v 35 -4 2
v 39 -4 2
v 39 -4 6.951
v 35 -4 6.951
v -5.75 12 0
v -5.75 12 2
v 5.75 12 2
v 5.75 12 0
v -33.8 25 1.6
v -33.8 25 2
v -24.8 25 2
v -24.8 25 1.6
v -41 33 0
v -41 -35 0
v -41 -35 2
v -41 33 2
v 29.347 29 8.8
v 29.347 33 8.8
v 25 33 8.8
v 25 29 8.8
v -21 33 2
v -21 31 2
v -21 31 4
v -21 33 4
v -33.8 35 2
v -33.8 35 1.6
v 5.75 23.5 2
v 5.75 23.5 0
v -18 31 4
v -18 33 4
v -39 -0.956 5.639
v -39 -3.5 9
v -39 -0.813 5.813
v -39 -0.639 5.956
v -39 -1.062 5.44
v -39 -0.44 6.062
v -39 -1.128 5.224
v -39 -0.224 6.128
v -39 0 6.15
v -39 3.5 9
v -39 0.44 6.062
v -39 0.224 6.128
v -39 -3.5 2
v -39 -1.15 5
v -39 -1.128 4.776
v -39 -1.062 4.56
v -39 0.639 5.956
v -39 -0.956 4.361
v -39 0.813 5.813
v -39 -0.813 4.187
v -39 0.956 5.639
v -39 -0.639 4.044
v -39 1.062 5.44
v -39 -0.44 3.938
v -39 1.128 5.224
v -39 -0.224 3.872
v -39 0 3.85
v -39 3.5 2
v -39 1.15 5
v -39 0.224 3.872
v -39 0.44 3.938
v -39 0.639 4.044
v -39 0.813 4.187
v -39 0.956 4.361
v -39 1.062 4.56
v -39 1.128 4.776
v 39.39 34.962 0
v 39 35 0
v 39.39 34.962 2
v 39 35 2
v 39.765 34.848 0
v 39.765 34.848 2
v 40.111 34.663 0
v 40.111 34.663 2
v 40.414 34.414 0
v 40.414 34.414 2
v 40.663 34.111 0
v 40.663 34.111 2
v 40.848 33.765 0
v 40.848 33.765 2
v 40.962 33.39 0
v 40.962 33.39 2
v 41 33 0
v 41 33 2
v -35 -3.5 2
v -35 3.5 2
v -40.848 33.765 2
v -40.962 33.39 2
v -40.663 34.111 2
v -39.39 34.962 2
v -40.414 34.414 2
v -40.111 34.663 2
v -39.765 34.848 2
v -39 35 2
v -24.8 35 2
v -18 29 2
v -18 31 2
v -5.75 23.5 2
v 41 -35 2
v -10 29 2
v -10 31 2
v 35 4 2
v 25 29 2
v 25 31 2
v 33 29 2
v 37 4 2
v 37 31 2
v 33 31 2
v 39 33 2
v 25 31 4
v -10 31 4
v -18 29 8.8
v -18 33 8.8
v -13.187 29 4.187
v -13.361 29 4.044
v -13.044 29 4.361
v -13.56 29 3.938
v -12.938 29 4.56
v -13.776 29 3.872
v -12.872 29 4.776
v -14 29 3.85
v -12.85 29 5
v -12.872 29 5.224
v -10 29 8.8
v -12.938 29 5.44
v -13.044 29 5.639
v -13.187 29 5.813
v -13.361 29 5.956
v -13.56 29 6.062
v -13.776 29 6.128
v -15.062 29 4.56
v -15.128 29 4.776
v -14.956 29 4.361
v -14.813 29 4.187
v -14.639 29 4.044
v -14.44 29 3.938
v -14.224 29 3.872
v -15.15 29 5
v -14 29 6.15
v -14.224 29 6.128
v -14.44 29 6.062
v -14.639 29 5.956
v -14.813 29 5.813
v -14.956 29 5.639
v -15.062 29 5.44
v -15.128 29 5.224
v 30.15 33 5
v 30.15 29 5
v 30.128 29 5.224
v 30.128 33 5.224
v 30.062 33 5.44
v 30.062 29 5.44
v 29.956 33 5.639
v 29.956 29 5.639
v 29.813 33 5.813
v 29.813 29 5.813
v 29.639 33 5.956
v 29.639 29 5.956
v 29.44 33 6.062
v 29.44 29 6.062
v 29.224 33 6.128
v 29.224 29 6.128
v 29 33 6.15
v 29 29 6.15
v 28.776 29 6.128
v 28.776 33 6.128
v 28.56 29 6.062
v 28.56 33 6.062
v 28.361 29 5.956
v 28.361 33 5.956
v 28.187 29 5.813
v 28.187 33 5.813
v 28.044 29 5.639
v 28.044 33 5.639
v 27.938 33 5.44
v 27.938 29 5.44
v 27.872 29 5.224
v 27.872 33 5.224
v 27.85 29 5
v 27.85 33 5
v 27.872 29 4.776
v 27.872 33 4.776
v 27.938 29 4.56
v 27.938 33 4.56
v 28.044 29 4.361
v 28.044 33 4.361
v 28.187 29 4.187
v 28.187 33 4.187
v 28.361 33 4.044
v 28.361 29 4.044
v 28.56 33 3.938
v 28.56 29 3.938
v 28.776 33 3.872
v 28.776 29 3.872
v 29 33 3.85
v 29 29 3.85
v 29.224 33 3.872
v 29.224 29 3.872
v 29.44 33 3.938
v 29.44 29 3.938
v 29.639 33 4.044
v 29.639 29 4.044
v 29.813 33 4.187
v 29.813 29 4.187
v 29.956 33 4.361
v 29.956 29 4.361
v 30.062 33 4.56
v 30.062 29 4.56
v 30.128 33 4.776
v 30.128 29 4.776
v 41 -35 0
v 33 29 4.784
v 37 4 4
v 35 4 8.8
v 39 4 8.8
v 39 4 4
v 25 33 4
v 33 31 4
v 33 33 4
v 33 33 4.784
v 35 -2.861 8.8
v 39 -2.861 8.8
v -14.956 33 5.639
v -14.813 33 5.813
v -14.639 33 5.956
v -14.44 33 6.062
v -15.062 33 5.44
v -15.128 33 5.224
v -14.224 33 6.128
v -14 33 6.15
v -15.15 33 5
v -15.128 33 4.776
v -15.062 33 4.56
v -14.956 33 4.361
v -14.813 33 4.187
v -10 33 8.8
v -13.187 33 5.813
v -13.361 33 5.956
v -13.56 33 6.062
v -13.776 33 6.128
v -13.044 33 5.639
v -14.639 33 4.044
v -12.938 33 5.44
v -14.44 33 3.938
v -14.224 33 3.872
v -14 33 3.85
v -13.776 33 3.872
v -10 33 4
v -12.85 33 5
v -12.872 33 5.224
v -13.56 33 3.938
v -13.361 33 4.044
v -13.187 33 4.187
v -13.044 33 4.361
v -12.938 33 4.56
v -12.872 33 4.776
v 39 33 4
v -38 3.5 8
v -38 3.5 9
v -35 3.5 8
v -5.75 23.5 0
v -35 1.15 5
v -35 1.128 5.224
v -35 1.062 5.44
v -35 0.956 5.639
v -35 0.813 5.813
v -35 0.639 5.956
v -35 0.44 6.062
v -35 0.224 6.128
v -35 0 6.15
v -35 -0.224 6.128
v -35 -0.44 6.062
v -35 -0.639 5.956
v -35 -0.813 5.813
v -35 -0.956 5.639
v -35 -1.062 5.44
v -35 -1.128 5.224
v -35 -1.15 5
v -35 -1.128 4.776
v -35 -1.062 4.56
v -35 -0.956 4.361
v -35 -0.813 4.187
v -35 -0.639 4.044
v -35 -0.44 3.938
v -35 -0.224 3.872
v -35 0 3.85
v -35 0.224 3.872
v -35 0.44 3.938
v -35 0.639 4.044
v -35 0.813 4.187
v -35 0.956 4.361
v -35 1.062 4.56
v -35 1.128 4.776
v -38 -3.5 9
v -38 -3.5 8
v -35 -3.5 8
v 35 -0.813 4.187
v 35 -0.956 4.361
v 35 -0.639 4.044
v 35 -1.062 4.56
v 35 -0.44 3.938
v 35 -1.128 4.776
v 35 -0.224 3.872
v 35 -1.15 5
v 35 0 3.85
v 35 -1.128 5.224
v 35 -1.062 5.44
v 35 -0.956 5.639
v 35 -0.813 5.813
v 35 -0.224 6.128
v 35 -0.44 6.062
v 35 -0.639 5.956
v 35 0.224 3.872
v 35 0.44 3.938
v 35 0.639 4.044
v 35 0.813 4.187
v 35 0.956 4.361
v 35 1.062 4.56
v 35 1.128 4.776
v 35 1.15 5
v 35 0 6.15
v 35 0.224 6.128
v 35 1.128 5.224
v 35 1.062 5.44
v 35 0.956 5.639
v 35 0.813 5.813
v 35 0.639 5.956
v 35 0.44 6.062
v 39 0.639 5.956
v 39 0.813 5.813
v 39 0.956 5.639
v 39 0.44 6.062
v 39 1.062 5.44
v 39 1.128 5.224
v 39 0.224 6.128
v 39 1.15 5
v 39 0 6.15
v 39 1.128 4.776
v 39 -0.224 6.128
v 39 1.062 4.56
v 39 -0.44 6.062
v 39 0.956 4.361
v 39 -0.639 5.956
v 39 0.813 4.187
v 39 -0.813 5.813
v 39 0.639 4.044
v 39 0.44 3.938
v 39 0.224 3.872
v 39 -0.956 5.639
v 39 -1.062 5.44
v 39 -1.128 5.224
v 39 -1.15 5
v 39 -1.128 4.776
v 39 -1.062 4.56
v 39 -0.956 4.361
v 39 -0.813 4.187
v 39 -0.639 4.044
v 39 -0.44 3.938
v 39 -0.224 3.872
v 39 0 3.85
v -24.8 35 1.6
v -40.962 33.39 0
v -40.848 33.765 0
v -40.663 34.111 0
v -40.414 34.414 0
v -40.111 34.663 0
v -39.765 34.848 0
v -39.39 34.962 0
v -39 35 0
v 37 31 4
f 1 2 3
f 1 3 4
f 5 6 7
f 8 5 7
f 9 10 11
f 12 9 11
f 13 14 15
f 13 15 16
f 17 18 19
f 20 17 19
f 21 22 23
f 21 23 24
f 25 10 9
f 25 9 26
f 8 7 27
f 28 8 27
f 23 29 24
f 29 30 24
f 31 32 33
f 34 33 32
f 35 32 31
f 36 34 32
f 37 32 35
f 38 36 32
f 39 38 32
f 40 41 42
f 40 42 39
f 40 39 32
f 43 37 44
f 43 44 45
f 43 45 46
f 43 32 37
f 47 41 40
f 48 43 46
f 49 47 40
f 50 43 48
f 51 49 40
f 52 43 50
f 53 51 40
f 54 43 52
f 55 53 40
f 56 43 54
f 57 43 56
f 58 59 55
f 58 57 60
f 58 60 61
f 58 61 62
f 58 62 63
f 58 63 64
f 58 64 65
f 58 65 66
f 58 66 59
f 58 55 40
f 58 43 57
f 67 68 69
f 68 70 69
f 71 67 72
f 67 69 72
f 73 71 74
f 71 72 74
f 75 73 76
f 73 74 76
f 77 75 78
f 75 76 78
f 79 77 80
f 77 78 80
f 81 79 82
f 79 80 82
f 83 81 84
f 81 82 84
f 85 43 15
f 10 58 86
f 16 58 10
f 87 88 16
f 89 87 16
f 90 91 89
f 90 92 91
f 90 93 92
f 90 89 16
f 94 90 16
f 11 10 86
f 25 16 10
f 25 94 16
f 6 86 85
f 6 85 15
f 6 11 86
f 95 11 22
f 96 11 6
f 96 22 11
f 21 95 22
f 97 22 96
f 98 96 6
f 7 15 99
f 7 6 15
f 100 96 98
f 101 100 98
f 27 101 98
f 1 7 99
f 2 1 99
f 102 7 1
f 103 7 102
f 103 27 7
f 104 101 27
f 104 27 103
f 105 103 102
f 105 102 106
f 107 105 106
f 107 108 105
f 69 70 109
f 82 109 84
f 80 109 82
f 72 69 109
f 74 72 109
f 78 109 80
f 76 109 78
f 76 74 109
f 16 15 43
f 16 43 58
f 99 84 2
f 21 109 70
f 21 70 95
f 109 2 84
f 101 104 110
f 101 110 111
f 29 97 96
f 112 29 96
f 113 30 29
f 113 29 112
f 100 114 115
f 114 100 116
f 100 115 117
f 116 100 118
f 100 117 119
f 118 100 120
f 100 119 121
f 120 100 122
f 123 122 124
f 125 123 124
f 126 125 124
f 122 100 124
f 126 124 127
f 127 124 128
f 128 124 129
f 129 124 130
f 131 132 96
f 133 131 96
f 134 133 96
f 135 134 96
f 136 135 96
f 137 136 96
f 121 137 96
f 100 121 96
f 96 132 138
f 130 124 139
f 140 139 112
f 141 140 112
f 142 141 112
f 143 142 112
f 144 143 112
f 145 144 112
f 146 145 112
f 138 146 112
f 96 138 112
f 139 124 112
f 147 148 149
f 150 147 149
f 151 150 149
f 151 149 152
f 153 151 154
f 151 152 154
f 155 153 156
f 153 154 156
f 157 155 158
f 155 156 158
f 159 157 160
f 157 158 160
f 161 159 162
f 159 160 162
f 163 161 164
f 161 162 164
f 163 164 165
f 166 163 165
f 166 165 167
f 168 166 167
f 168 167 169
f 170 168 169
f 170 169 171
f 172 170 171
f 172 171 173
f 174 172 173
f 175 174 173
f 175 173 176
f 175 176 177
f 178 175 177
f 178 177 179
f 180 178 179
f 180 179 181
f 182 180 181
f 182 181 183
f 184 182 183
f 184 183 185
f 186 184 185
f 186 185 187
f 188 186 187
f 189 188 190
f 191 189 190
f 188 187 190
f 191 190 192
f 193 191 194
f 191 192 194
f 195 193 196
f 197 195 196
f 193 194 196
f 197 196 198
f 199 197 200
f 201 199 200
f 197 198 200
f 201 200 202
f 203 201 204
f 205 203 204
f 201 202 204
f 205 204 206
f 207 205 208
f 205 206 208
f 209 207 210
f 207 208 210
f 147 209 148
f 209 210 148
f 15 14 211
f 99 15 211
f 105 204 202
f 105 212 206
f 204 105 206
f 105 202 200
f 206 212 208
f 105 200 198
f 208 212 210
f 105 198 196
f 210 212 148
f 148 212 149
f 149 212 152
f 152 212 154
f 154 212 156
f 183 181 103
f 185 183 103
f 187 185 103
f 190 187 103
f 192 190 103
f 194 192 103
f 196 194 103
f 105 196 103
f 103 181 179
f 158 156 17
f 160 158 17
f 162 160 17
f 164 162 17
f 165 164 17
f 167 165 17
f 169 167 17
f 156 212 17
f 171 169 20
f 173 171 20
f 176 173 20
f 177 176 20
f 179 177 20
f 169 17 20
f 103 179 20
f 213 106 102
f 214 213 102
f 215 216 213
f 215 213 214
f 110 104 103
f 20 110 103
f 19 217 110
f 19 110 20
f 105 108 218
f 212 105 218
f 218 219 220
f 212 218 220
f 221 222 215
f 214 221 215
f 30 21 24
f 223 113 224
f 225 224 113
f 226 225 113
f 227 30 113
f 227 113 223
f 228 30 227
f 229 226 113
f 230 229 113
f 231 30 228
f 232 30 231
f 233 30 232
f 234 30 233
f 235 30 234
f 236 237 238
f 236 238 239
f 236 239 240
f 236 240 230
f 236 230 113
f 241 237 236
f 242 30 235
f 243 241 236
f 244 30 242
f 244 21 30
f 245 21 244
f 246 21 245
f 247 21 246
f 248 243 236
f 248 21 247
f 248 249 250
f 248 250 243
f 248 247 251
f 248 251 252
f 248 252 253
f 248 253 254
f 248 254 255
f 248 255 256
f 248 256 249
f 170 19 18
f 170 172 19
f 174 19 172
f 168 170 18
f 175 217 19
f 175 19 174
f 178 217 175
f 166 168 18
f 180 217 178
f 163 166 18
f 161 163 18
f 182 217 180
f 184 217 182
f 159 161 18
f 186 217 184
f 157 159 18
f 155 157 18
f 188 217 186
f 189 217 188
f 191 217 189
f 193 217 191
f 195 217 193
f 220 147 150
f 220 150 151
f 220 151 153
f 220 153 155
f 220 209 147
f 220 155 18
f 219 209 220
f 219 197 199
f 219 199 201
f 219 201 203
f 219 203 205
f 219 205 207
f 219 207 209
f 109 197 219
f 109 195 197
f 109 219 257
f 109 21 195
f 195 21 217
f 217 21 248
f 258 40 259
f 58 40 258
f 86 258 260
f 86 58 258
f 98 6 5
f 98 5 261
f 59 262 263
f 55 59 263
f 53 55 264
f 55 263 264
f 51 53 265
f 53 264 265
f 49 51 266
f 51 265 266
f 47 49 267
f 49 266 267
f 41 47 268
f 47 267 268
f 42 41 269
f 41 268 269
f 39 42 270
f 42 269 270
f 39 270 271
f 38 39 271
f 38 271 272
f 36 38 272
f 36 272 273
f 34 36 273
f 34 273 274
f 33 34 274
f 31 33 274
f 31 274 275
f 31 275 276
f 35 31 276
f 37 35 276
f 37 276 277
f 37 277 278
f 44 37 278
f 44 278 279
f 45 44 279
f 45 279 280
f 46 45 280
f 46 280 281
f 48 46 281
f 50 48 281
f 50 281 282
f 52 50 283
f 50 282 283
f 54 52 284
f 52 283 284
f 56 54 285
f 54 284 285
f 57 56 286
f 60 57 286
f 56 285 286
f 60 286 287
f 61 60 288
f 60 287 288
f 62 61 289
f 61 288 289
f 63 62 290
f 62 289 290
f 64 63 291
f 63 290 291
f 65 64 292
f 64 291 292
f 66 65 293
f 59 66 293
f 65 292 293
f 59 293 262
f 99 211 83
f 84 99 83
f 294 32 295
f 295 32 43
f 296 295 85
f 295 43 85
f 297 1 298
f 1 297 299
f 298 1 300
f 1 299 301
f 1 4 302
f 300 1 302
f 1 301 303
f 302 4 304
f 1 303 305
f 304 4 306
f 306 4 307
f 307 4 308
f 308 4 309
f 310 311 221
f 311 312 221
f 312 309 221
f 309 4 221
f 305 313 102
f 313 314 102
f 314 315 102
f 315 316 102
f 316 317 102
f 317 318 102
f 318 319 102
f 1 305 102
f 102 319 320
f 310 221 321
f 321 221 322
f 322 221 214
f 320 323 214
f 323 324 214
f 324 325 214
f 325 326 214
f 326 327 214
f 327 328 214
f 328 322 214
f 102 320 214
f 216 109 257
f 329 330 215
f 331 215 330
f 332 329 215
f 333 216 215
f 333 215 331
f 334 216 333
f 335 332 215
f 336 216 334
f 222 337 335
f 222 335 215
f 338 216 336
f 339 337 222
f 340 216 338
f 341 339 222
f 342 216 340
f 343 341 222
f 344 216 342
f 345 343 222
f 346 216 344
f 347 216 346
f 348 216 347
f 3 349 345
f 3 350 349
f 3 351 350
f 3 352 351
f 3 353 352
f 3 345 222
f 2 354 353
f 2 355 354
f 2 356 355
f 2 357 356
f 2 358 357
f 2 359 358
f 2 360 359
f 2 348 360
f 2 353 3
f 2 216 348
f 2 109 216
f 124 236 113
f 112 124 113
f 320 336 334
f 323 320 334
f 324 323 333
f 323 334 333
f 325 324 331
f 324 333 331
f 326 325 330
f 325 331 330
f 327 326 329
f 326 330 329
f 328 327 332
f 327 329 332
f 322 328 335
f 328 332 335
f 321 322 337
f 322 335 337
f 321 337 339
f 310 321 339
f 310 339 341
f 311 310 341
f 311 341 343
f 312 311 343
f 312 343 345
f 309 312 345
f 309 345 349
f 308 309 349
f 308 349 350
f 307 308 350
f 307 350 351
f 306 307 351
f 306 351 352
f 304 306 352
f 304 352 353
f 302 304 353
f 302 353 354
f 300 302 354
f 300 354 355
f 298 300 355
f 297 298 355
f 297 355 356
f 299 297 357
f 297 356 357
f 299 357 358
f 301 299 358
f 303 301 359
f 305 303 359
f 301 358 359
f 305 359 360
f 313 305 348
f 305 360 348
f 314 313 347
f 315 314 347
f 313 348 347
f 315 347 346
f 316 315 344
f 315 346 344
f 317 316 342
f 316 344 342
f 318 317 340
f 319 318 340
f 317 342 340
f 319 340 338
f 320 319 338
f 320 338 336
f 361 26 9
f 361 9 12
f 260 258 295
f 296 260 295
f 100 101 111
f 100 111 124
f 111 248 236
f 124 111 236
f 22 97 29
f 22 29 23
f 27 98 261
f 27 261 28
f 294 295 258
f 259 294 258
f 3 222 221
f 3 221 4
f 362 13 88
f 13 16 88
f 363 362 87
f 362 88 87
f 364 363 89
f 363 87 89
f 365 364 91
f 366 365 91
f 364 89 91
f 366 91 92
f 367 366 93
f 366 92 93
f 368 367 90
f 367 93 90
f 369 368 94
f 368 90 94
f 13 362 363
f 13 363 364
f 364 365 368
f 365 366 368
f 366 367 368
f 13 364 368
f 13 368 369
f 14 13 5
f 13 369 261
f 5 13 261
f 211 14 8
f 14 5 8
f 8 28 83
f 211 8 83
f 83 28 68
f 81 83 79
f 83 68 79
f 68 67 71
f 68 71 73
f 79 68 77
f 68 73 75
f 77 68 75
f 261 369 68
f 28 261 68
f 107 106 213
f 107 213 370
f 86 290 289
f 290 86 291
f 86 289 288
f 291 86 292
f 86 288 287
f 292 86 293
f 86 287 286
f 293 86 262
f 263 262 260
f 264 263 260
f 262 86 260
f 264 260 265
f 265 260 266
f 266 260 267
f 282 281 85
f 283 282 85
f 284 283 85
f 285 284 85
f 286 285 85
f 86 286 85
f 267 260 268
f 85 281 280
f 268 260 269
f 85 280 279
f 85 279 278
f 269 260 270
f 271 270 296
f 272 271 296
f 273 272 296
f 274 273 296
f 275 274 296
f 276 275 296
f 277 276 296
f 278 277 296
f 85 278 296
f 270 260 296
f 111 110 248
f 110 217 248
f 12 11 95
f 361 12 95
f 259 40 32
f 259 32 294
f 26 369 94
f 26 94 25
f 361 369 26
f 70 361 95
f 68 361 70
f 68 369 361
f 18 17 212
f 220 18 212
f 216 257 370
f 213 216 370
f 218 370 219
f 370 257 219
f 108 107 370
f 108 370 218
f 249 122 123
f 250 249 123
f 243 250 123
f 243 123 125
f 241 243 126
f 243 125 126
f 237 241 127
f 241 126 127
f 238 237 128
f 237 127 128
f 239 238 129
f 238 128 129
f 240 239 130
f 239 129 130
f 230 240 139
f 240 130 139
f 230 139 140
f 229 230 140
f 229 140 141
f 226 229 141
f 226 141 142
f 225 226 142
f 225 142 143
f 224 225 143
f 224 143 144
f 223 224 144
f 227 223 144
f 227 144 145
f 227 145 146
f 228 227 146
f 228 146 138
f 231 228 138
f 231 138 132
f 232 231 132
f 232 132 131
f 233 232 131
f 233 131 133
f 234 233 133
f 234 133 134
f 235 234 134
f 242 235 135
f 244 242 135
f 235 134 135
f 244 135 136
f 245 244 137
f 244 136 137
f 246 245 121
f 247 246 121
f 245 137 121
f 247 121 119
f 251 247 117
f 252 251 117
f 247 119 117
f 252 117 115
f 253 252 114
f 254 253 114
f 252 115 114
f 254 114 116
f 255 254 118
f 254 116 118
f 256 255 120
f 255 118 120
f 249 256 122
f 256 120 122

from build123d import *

# Parameters (mm, degrees)
SKETCH_W        = 82
SKETCH_H        = 70
PAD_DEPTH       = 2
SKETCH001_W     = 2
SKETCH001_H     = 7
PAD001_DEPTH    = 2
SKETCH011_W     = 8
SKETCH011_H     = 6.8
PAD002_DEPTH    = 4
SKETCH012_W     = 7
SKETCH012_H     = 6
PAD003_DEPTH    = 4
SKETCH010_W     = 8
SKETCH010_H     = 6.8
PAD004_DEPTH    = 4
SKETCH013_R     = 1.15
POCKET_DEPTH    = 80.001
SKETCH016_R     = 1.15
POCKET001_DEPTH = 8.501
SKETCH018_W     = 11.5
SKETCH018_H     = 11.5
POCKET002_DEPTH = 5
POCKET003_DEPTH = 5
POCKET004_DEPTH = 5
SKETCH021_W     = 1
SKETCH021_H     = 7
PAD005_DEPTH    = 1
SKETCH022_W     = 9
SKETCH022_H     = 10
POCKET005_DEPTH = 0.4
FILLET_R        = 2


with BuildPart() as part:
    # Sketch → Pad (new body)
    with BuildSketch(Plane.XY):
        Rectangle(SKETCH_W, SKETCH_H)
    extrude(amount=PAD_DEPTH)

    # Sketch001 (on Face6 of Pad) → Pad001 (join)
    with BuildSketch(Plane.XY.offset(2)):
        with Locations((-38, 0)):
            Rectangle(SKETCH001_W, SKETCH001_H)
        Polygon((-21, 33), (39, 33), (39, -4), (37, -4), (37, 31), (-21, 31), align=None)
    extrude(amount=PAD001_DEPTH)

    # Sketch011 (on Face15 of Pad001) → Pad002 (join)
    with BuildSketch(Plane.YZ.offset(39)):
        with Locations((0, 5.4)):
            Rectangle(SKETCH011_W, SKETCH011_H)
    extrude(amount=-PAD002_DEPTH)

    # Sketch012 (on Face9 of Pad002) → Pad003 (join)
    with BuildSketch(Plane(origin=(-39, 0, 0), x_dir=(0, -1, 0), z_dir=(-1, 0, 0))):
        with Locations((0, 5)):
            Rectangle(SKETCH012_W, SKETCH012_H)
    extrude(amount=-PAD003_DEPTH)

    # Sketch010 (on Face16 of Pad001) → Pad004 (join)
    with BuildSketch(Plane(origin=(0, 33, 0), x_dir=(-1, 0, 0), z_dir=(0, 1, 0))):
        with Locations((-29, 5.4)):
            Rectangle(SKETCH010_W, SKETCH010_H)
        with Locations((14, 5.4)):
            Rectangle(SKETCH010_W, SKETCH010_H)
    extrude(amount=-PAD004_DEPTH)

    # Sketch013 (on Face44 of Pad004) → Pocket (cut, through all)
    with BuildSketch(Plane.YZ.offset(39)):
        with Locations((0, 5)):
            Circle(SKETCH013_R)
    extrude(amount=-POCKET_DEPTH, mode=Mode.SUBTRACT)

    # Sketch016 → Pocket001 (cut, through all)
    with BuildSketch(Plane.XZ.offset(-26.5)):
        with Locations((-14, 5)):
            Circle(SKETCH016_R)
        with Locations((29, 5)):
            Circle(SKETCH016_R)
    extrude(amount=-POCKET001_DEPTH, mode=Mode.SUBTRACT)

    # Sketch018 (on Face5 of Pocket001) → Pocket002 (cut)
    with BuildSketch(Plane.XY.offset(2)):
        with Locations((0, 17.75)):
            Rectangle(SKETCH018_W, SKETCH018_H)
    extrude(amount=-POCKET002_DEPTH, mode=Mode.SUBTRACT)

    # Sketch019 (on Face31 of Pocket002) → Pocket003 (cut)
    with BuildSketch(Plane.XZ.offset(-29)):
        Polygon((29.125944, 9.042901), (33.258869, 4.499726), (33.258869, 9.042901), align=None)
    extrude(amount=-POCKET003_DEPTH, mode=Mode.SUBTRACT)

    # Sketch020 (on Face36 of Pocket003) → Pocket004 (cut)
    with BuildSketch(Plane(origin=(35, 0, 0), x_dir=(0, -1, 0), z_dir=(-1, 0, 0))):
        Polygon((2.77547, 8.938441), (6.386171, 3.079567), (6.386171, 8.938441), align=None)
    extrude(amount=-POCKET004_DEPTH, mode=Mode.SUBTRACT)

    # Sketch021 (on Face40 of Pocket004) → Pad005 (join)
    with BuildSketch(Plane.XY.offset(8)):
        with Locations((-38.5, 0)):
            Rectangle(SKETCH021_W, SKETCH021_H)
    extrude(amount=PAD005_DEPTH)

    # Sketch022 (on Face5 of Pocket003) → Pocket005 (cut)
    with BuildSketch(Plane.XY.offset(2)):
        with Locations((-29.3, 30)):
            Rectangle(SKETCH022_W, SKETCH022_H)
    extrude(amount=-POCKET005_DEPTH, mode=Mode.SUBTRACT)

    # Fillet
    fillet_edges = [part.edges().sort_by_distance(p)[0] for p in [
        (41, 35, 1),
        (-41, 35, 1),
    ]]
    fillet(fillet_edges, radius=FILLET_R)


solid = part.part
